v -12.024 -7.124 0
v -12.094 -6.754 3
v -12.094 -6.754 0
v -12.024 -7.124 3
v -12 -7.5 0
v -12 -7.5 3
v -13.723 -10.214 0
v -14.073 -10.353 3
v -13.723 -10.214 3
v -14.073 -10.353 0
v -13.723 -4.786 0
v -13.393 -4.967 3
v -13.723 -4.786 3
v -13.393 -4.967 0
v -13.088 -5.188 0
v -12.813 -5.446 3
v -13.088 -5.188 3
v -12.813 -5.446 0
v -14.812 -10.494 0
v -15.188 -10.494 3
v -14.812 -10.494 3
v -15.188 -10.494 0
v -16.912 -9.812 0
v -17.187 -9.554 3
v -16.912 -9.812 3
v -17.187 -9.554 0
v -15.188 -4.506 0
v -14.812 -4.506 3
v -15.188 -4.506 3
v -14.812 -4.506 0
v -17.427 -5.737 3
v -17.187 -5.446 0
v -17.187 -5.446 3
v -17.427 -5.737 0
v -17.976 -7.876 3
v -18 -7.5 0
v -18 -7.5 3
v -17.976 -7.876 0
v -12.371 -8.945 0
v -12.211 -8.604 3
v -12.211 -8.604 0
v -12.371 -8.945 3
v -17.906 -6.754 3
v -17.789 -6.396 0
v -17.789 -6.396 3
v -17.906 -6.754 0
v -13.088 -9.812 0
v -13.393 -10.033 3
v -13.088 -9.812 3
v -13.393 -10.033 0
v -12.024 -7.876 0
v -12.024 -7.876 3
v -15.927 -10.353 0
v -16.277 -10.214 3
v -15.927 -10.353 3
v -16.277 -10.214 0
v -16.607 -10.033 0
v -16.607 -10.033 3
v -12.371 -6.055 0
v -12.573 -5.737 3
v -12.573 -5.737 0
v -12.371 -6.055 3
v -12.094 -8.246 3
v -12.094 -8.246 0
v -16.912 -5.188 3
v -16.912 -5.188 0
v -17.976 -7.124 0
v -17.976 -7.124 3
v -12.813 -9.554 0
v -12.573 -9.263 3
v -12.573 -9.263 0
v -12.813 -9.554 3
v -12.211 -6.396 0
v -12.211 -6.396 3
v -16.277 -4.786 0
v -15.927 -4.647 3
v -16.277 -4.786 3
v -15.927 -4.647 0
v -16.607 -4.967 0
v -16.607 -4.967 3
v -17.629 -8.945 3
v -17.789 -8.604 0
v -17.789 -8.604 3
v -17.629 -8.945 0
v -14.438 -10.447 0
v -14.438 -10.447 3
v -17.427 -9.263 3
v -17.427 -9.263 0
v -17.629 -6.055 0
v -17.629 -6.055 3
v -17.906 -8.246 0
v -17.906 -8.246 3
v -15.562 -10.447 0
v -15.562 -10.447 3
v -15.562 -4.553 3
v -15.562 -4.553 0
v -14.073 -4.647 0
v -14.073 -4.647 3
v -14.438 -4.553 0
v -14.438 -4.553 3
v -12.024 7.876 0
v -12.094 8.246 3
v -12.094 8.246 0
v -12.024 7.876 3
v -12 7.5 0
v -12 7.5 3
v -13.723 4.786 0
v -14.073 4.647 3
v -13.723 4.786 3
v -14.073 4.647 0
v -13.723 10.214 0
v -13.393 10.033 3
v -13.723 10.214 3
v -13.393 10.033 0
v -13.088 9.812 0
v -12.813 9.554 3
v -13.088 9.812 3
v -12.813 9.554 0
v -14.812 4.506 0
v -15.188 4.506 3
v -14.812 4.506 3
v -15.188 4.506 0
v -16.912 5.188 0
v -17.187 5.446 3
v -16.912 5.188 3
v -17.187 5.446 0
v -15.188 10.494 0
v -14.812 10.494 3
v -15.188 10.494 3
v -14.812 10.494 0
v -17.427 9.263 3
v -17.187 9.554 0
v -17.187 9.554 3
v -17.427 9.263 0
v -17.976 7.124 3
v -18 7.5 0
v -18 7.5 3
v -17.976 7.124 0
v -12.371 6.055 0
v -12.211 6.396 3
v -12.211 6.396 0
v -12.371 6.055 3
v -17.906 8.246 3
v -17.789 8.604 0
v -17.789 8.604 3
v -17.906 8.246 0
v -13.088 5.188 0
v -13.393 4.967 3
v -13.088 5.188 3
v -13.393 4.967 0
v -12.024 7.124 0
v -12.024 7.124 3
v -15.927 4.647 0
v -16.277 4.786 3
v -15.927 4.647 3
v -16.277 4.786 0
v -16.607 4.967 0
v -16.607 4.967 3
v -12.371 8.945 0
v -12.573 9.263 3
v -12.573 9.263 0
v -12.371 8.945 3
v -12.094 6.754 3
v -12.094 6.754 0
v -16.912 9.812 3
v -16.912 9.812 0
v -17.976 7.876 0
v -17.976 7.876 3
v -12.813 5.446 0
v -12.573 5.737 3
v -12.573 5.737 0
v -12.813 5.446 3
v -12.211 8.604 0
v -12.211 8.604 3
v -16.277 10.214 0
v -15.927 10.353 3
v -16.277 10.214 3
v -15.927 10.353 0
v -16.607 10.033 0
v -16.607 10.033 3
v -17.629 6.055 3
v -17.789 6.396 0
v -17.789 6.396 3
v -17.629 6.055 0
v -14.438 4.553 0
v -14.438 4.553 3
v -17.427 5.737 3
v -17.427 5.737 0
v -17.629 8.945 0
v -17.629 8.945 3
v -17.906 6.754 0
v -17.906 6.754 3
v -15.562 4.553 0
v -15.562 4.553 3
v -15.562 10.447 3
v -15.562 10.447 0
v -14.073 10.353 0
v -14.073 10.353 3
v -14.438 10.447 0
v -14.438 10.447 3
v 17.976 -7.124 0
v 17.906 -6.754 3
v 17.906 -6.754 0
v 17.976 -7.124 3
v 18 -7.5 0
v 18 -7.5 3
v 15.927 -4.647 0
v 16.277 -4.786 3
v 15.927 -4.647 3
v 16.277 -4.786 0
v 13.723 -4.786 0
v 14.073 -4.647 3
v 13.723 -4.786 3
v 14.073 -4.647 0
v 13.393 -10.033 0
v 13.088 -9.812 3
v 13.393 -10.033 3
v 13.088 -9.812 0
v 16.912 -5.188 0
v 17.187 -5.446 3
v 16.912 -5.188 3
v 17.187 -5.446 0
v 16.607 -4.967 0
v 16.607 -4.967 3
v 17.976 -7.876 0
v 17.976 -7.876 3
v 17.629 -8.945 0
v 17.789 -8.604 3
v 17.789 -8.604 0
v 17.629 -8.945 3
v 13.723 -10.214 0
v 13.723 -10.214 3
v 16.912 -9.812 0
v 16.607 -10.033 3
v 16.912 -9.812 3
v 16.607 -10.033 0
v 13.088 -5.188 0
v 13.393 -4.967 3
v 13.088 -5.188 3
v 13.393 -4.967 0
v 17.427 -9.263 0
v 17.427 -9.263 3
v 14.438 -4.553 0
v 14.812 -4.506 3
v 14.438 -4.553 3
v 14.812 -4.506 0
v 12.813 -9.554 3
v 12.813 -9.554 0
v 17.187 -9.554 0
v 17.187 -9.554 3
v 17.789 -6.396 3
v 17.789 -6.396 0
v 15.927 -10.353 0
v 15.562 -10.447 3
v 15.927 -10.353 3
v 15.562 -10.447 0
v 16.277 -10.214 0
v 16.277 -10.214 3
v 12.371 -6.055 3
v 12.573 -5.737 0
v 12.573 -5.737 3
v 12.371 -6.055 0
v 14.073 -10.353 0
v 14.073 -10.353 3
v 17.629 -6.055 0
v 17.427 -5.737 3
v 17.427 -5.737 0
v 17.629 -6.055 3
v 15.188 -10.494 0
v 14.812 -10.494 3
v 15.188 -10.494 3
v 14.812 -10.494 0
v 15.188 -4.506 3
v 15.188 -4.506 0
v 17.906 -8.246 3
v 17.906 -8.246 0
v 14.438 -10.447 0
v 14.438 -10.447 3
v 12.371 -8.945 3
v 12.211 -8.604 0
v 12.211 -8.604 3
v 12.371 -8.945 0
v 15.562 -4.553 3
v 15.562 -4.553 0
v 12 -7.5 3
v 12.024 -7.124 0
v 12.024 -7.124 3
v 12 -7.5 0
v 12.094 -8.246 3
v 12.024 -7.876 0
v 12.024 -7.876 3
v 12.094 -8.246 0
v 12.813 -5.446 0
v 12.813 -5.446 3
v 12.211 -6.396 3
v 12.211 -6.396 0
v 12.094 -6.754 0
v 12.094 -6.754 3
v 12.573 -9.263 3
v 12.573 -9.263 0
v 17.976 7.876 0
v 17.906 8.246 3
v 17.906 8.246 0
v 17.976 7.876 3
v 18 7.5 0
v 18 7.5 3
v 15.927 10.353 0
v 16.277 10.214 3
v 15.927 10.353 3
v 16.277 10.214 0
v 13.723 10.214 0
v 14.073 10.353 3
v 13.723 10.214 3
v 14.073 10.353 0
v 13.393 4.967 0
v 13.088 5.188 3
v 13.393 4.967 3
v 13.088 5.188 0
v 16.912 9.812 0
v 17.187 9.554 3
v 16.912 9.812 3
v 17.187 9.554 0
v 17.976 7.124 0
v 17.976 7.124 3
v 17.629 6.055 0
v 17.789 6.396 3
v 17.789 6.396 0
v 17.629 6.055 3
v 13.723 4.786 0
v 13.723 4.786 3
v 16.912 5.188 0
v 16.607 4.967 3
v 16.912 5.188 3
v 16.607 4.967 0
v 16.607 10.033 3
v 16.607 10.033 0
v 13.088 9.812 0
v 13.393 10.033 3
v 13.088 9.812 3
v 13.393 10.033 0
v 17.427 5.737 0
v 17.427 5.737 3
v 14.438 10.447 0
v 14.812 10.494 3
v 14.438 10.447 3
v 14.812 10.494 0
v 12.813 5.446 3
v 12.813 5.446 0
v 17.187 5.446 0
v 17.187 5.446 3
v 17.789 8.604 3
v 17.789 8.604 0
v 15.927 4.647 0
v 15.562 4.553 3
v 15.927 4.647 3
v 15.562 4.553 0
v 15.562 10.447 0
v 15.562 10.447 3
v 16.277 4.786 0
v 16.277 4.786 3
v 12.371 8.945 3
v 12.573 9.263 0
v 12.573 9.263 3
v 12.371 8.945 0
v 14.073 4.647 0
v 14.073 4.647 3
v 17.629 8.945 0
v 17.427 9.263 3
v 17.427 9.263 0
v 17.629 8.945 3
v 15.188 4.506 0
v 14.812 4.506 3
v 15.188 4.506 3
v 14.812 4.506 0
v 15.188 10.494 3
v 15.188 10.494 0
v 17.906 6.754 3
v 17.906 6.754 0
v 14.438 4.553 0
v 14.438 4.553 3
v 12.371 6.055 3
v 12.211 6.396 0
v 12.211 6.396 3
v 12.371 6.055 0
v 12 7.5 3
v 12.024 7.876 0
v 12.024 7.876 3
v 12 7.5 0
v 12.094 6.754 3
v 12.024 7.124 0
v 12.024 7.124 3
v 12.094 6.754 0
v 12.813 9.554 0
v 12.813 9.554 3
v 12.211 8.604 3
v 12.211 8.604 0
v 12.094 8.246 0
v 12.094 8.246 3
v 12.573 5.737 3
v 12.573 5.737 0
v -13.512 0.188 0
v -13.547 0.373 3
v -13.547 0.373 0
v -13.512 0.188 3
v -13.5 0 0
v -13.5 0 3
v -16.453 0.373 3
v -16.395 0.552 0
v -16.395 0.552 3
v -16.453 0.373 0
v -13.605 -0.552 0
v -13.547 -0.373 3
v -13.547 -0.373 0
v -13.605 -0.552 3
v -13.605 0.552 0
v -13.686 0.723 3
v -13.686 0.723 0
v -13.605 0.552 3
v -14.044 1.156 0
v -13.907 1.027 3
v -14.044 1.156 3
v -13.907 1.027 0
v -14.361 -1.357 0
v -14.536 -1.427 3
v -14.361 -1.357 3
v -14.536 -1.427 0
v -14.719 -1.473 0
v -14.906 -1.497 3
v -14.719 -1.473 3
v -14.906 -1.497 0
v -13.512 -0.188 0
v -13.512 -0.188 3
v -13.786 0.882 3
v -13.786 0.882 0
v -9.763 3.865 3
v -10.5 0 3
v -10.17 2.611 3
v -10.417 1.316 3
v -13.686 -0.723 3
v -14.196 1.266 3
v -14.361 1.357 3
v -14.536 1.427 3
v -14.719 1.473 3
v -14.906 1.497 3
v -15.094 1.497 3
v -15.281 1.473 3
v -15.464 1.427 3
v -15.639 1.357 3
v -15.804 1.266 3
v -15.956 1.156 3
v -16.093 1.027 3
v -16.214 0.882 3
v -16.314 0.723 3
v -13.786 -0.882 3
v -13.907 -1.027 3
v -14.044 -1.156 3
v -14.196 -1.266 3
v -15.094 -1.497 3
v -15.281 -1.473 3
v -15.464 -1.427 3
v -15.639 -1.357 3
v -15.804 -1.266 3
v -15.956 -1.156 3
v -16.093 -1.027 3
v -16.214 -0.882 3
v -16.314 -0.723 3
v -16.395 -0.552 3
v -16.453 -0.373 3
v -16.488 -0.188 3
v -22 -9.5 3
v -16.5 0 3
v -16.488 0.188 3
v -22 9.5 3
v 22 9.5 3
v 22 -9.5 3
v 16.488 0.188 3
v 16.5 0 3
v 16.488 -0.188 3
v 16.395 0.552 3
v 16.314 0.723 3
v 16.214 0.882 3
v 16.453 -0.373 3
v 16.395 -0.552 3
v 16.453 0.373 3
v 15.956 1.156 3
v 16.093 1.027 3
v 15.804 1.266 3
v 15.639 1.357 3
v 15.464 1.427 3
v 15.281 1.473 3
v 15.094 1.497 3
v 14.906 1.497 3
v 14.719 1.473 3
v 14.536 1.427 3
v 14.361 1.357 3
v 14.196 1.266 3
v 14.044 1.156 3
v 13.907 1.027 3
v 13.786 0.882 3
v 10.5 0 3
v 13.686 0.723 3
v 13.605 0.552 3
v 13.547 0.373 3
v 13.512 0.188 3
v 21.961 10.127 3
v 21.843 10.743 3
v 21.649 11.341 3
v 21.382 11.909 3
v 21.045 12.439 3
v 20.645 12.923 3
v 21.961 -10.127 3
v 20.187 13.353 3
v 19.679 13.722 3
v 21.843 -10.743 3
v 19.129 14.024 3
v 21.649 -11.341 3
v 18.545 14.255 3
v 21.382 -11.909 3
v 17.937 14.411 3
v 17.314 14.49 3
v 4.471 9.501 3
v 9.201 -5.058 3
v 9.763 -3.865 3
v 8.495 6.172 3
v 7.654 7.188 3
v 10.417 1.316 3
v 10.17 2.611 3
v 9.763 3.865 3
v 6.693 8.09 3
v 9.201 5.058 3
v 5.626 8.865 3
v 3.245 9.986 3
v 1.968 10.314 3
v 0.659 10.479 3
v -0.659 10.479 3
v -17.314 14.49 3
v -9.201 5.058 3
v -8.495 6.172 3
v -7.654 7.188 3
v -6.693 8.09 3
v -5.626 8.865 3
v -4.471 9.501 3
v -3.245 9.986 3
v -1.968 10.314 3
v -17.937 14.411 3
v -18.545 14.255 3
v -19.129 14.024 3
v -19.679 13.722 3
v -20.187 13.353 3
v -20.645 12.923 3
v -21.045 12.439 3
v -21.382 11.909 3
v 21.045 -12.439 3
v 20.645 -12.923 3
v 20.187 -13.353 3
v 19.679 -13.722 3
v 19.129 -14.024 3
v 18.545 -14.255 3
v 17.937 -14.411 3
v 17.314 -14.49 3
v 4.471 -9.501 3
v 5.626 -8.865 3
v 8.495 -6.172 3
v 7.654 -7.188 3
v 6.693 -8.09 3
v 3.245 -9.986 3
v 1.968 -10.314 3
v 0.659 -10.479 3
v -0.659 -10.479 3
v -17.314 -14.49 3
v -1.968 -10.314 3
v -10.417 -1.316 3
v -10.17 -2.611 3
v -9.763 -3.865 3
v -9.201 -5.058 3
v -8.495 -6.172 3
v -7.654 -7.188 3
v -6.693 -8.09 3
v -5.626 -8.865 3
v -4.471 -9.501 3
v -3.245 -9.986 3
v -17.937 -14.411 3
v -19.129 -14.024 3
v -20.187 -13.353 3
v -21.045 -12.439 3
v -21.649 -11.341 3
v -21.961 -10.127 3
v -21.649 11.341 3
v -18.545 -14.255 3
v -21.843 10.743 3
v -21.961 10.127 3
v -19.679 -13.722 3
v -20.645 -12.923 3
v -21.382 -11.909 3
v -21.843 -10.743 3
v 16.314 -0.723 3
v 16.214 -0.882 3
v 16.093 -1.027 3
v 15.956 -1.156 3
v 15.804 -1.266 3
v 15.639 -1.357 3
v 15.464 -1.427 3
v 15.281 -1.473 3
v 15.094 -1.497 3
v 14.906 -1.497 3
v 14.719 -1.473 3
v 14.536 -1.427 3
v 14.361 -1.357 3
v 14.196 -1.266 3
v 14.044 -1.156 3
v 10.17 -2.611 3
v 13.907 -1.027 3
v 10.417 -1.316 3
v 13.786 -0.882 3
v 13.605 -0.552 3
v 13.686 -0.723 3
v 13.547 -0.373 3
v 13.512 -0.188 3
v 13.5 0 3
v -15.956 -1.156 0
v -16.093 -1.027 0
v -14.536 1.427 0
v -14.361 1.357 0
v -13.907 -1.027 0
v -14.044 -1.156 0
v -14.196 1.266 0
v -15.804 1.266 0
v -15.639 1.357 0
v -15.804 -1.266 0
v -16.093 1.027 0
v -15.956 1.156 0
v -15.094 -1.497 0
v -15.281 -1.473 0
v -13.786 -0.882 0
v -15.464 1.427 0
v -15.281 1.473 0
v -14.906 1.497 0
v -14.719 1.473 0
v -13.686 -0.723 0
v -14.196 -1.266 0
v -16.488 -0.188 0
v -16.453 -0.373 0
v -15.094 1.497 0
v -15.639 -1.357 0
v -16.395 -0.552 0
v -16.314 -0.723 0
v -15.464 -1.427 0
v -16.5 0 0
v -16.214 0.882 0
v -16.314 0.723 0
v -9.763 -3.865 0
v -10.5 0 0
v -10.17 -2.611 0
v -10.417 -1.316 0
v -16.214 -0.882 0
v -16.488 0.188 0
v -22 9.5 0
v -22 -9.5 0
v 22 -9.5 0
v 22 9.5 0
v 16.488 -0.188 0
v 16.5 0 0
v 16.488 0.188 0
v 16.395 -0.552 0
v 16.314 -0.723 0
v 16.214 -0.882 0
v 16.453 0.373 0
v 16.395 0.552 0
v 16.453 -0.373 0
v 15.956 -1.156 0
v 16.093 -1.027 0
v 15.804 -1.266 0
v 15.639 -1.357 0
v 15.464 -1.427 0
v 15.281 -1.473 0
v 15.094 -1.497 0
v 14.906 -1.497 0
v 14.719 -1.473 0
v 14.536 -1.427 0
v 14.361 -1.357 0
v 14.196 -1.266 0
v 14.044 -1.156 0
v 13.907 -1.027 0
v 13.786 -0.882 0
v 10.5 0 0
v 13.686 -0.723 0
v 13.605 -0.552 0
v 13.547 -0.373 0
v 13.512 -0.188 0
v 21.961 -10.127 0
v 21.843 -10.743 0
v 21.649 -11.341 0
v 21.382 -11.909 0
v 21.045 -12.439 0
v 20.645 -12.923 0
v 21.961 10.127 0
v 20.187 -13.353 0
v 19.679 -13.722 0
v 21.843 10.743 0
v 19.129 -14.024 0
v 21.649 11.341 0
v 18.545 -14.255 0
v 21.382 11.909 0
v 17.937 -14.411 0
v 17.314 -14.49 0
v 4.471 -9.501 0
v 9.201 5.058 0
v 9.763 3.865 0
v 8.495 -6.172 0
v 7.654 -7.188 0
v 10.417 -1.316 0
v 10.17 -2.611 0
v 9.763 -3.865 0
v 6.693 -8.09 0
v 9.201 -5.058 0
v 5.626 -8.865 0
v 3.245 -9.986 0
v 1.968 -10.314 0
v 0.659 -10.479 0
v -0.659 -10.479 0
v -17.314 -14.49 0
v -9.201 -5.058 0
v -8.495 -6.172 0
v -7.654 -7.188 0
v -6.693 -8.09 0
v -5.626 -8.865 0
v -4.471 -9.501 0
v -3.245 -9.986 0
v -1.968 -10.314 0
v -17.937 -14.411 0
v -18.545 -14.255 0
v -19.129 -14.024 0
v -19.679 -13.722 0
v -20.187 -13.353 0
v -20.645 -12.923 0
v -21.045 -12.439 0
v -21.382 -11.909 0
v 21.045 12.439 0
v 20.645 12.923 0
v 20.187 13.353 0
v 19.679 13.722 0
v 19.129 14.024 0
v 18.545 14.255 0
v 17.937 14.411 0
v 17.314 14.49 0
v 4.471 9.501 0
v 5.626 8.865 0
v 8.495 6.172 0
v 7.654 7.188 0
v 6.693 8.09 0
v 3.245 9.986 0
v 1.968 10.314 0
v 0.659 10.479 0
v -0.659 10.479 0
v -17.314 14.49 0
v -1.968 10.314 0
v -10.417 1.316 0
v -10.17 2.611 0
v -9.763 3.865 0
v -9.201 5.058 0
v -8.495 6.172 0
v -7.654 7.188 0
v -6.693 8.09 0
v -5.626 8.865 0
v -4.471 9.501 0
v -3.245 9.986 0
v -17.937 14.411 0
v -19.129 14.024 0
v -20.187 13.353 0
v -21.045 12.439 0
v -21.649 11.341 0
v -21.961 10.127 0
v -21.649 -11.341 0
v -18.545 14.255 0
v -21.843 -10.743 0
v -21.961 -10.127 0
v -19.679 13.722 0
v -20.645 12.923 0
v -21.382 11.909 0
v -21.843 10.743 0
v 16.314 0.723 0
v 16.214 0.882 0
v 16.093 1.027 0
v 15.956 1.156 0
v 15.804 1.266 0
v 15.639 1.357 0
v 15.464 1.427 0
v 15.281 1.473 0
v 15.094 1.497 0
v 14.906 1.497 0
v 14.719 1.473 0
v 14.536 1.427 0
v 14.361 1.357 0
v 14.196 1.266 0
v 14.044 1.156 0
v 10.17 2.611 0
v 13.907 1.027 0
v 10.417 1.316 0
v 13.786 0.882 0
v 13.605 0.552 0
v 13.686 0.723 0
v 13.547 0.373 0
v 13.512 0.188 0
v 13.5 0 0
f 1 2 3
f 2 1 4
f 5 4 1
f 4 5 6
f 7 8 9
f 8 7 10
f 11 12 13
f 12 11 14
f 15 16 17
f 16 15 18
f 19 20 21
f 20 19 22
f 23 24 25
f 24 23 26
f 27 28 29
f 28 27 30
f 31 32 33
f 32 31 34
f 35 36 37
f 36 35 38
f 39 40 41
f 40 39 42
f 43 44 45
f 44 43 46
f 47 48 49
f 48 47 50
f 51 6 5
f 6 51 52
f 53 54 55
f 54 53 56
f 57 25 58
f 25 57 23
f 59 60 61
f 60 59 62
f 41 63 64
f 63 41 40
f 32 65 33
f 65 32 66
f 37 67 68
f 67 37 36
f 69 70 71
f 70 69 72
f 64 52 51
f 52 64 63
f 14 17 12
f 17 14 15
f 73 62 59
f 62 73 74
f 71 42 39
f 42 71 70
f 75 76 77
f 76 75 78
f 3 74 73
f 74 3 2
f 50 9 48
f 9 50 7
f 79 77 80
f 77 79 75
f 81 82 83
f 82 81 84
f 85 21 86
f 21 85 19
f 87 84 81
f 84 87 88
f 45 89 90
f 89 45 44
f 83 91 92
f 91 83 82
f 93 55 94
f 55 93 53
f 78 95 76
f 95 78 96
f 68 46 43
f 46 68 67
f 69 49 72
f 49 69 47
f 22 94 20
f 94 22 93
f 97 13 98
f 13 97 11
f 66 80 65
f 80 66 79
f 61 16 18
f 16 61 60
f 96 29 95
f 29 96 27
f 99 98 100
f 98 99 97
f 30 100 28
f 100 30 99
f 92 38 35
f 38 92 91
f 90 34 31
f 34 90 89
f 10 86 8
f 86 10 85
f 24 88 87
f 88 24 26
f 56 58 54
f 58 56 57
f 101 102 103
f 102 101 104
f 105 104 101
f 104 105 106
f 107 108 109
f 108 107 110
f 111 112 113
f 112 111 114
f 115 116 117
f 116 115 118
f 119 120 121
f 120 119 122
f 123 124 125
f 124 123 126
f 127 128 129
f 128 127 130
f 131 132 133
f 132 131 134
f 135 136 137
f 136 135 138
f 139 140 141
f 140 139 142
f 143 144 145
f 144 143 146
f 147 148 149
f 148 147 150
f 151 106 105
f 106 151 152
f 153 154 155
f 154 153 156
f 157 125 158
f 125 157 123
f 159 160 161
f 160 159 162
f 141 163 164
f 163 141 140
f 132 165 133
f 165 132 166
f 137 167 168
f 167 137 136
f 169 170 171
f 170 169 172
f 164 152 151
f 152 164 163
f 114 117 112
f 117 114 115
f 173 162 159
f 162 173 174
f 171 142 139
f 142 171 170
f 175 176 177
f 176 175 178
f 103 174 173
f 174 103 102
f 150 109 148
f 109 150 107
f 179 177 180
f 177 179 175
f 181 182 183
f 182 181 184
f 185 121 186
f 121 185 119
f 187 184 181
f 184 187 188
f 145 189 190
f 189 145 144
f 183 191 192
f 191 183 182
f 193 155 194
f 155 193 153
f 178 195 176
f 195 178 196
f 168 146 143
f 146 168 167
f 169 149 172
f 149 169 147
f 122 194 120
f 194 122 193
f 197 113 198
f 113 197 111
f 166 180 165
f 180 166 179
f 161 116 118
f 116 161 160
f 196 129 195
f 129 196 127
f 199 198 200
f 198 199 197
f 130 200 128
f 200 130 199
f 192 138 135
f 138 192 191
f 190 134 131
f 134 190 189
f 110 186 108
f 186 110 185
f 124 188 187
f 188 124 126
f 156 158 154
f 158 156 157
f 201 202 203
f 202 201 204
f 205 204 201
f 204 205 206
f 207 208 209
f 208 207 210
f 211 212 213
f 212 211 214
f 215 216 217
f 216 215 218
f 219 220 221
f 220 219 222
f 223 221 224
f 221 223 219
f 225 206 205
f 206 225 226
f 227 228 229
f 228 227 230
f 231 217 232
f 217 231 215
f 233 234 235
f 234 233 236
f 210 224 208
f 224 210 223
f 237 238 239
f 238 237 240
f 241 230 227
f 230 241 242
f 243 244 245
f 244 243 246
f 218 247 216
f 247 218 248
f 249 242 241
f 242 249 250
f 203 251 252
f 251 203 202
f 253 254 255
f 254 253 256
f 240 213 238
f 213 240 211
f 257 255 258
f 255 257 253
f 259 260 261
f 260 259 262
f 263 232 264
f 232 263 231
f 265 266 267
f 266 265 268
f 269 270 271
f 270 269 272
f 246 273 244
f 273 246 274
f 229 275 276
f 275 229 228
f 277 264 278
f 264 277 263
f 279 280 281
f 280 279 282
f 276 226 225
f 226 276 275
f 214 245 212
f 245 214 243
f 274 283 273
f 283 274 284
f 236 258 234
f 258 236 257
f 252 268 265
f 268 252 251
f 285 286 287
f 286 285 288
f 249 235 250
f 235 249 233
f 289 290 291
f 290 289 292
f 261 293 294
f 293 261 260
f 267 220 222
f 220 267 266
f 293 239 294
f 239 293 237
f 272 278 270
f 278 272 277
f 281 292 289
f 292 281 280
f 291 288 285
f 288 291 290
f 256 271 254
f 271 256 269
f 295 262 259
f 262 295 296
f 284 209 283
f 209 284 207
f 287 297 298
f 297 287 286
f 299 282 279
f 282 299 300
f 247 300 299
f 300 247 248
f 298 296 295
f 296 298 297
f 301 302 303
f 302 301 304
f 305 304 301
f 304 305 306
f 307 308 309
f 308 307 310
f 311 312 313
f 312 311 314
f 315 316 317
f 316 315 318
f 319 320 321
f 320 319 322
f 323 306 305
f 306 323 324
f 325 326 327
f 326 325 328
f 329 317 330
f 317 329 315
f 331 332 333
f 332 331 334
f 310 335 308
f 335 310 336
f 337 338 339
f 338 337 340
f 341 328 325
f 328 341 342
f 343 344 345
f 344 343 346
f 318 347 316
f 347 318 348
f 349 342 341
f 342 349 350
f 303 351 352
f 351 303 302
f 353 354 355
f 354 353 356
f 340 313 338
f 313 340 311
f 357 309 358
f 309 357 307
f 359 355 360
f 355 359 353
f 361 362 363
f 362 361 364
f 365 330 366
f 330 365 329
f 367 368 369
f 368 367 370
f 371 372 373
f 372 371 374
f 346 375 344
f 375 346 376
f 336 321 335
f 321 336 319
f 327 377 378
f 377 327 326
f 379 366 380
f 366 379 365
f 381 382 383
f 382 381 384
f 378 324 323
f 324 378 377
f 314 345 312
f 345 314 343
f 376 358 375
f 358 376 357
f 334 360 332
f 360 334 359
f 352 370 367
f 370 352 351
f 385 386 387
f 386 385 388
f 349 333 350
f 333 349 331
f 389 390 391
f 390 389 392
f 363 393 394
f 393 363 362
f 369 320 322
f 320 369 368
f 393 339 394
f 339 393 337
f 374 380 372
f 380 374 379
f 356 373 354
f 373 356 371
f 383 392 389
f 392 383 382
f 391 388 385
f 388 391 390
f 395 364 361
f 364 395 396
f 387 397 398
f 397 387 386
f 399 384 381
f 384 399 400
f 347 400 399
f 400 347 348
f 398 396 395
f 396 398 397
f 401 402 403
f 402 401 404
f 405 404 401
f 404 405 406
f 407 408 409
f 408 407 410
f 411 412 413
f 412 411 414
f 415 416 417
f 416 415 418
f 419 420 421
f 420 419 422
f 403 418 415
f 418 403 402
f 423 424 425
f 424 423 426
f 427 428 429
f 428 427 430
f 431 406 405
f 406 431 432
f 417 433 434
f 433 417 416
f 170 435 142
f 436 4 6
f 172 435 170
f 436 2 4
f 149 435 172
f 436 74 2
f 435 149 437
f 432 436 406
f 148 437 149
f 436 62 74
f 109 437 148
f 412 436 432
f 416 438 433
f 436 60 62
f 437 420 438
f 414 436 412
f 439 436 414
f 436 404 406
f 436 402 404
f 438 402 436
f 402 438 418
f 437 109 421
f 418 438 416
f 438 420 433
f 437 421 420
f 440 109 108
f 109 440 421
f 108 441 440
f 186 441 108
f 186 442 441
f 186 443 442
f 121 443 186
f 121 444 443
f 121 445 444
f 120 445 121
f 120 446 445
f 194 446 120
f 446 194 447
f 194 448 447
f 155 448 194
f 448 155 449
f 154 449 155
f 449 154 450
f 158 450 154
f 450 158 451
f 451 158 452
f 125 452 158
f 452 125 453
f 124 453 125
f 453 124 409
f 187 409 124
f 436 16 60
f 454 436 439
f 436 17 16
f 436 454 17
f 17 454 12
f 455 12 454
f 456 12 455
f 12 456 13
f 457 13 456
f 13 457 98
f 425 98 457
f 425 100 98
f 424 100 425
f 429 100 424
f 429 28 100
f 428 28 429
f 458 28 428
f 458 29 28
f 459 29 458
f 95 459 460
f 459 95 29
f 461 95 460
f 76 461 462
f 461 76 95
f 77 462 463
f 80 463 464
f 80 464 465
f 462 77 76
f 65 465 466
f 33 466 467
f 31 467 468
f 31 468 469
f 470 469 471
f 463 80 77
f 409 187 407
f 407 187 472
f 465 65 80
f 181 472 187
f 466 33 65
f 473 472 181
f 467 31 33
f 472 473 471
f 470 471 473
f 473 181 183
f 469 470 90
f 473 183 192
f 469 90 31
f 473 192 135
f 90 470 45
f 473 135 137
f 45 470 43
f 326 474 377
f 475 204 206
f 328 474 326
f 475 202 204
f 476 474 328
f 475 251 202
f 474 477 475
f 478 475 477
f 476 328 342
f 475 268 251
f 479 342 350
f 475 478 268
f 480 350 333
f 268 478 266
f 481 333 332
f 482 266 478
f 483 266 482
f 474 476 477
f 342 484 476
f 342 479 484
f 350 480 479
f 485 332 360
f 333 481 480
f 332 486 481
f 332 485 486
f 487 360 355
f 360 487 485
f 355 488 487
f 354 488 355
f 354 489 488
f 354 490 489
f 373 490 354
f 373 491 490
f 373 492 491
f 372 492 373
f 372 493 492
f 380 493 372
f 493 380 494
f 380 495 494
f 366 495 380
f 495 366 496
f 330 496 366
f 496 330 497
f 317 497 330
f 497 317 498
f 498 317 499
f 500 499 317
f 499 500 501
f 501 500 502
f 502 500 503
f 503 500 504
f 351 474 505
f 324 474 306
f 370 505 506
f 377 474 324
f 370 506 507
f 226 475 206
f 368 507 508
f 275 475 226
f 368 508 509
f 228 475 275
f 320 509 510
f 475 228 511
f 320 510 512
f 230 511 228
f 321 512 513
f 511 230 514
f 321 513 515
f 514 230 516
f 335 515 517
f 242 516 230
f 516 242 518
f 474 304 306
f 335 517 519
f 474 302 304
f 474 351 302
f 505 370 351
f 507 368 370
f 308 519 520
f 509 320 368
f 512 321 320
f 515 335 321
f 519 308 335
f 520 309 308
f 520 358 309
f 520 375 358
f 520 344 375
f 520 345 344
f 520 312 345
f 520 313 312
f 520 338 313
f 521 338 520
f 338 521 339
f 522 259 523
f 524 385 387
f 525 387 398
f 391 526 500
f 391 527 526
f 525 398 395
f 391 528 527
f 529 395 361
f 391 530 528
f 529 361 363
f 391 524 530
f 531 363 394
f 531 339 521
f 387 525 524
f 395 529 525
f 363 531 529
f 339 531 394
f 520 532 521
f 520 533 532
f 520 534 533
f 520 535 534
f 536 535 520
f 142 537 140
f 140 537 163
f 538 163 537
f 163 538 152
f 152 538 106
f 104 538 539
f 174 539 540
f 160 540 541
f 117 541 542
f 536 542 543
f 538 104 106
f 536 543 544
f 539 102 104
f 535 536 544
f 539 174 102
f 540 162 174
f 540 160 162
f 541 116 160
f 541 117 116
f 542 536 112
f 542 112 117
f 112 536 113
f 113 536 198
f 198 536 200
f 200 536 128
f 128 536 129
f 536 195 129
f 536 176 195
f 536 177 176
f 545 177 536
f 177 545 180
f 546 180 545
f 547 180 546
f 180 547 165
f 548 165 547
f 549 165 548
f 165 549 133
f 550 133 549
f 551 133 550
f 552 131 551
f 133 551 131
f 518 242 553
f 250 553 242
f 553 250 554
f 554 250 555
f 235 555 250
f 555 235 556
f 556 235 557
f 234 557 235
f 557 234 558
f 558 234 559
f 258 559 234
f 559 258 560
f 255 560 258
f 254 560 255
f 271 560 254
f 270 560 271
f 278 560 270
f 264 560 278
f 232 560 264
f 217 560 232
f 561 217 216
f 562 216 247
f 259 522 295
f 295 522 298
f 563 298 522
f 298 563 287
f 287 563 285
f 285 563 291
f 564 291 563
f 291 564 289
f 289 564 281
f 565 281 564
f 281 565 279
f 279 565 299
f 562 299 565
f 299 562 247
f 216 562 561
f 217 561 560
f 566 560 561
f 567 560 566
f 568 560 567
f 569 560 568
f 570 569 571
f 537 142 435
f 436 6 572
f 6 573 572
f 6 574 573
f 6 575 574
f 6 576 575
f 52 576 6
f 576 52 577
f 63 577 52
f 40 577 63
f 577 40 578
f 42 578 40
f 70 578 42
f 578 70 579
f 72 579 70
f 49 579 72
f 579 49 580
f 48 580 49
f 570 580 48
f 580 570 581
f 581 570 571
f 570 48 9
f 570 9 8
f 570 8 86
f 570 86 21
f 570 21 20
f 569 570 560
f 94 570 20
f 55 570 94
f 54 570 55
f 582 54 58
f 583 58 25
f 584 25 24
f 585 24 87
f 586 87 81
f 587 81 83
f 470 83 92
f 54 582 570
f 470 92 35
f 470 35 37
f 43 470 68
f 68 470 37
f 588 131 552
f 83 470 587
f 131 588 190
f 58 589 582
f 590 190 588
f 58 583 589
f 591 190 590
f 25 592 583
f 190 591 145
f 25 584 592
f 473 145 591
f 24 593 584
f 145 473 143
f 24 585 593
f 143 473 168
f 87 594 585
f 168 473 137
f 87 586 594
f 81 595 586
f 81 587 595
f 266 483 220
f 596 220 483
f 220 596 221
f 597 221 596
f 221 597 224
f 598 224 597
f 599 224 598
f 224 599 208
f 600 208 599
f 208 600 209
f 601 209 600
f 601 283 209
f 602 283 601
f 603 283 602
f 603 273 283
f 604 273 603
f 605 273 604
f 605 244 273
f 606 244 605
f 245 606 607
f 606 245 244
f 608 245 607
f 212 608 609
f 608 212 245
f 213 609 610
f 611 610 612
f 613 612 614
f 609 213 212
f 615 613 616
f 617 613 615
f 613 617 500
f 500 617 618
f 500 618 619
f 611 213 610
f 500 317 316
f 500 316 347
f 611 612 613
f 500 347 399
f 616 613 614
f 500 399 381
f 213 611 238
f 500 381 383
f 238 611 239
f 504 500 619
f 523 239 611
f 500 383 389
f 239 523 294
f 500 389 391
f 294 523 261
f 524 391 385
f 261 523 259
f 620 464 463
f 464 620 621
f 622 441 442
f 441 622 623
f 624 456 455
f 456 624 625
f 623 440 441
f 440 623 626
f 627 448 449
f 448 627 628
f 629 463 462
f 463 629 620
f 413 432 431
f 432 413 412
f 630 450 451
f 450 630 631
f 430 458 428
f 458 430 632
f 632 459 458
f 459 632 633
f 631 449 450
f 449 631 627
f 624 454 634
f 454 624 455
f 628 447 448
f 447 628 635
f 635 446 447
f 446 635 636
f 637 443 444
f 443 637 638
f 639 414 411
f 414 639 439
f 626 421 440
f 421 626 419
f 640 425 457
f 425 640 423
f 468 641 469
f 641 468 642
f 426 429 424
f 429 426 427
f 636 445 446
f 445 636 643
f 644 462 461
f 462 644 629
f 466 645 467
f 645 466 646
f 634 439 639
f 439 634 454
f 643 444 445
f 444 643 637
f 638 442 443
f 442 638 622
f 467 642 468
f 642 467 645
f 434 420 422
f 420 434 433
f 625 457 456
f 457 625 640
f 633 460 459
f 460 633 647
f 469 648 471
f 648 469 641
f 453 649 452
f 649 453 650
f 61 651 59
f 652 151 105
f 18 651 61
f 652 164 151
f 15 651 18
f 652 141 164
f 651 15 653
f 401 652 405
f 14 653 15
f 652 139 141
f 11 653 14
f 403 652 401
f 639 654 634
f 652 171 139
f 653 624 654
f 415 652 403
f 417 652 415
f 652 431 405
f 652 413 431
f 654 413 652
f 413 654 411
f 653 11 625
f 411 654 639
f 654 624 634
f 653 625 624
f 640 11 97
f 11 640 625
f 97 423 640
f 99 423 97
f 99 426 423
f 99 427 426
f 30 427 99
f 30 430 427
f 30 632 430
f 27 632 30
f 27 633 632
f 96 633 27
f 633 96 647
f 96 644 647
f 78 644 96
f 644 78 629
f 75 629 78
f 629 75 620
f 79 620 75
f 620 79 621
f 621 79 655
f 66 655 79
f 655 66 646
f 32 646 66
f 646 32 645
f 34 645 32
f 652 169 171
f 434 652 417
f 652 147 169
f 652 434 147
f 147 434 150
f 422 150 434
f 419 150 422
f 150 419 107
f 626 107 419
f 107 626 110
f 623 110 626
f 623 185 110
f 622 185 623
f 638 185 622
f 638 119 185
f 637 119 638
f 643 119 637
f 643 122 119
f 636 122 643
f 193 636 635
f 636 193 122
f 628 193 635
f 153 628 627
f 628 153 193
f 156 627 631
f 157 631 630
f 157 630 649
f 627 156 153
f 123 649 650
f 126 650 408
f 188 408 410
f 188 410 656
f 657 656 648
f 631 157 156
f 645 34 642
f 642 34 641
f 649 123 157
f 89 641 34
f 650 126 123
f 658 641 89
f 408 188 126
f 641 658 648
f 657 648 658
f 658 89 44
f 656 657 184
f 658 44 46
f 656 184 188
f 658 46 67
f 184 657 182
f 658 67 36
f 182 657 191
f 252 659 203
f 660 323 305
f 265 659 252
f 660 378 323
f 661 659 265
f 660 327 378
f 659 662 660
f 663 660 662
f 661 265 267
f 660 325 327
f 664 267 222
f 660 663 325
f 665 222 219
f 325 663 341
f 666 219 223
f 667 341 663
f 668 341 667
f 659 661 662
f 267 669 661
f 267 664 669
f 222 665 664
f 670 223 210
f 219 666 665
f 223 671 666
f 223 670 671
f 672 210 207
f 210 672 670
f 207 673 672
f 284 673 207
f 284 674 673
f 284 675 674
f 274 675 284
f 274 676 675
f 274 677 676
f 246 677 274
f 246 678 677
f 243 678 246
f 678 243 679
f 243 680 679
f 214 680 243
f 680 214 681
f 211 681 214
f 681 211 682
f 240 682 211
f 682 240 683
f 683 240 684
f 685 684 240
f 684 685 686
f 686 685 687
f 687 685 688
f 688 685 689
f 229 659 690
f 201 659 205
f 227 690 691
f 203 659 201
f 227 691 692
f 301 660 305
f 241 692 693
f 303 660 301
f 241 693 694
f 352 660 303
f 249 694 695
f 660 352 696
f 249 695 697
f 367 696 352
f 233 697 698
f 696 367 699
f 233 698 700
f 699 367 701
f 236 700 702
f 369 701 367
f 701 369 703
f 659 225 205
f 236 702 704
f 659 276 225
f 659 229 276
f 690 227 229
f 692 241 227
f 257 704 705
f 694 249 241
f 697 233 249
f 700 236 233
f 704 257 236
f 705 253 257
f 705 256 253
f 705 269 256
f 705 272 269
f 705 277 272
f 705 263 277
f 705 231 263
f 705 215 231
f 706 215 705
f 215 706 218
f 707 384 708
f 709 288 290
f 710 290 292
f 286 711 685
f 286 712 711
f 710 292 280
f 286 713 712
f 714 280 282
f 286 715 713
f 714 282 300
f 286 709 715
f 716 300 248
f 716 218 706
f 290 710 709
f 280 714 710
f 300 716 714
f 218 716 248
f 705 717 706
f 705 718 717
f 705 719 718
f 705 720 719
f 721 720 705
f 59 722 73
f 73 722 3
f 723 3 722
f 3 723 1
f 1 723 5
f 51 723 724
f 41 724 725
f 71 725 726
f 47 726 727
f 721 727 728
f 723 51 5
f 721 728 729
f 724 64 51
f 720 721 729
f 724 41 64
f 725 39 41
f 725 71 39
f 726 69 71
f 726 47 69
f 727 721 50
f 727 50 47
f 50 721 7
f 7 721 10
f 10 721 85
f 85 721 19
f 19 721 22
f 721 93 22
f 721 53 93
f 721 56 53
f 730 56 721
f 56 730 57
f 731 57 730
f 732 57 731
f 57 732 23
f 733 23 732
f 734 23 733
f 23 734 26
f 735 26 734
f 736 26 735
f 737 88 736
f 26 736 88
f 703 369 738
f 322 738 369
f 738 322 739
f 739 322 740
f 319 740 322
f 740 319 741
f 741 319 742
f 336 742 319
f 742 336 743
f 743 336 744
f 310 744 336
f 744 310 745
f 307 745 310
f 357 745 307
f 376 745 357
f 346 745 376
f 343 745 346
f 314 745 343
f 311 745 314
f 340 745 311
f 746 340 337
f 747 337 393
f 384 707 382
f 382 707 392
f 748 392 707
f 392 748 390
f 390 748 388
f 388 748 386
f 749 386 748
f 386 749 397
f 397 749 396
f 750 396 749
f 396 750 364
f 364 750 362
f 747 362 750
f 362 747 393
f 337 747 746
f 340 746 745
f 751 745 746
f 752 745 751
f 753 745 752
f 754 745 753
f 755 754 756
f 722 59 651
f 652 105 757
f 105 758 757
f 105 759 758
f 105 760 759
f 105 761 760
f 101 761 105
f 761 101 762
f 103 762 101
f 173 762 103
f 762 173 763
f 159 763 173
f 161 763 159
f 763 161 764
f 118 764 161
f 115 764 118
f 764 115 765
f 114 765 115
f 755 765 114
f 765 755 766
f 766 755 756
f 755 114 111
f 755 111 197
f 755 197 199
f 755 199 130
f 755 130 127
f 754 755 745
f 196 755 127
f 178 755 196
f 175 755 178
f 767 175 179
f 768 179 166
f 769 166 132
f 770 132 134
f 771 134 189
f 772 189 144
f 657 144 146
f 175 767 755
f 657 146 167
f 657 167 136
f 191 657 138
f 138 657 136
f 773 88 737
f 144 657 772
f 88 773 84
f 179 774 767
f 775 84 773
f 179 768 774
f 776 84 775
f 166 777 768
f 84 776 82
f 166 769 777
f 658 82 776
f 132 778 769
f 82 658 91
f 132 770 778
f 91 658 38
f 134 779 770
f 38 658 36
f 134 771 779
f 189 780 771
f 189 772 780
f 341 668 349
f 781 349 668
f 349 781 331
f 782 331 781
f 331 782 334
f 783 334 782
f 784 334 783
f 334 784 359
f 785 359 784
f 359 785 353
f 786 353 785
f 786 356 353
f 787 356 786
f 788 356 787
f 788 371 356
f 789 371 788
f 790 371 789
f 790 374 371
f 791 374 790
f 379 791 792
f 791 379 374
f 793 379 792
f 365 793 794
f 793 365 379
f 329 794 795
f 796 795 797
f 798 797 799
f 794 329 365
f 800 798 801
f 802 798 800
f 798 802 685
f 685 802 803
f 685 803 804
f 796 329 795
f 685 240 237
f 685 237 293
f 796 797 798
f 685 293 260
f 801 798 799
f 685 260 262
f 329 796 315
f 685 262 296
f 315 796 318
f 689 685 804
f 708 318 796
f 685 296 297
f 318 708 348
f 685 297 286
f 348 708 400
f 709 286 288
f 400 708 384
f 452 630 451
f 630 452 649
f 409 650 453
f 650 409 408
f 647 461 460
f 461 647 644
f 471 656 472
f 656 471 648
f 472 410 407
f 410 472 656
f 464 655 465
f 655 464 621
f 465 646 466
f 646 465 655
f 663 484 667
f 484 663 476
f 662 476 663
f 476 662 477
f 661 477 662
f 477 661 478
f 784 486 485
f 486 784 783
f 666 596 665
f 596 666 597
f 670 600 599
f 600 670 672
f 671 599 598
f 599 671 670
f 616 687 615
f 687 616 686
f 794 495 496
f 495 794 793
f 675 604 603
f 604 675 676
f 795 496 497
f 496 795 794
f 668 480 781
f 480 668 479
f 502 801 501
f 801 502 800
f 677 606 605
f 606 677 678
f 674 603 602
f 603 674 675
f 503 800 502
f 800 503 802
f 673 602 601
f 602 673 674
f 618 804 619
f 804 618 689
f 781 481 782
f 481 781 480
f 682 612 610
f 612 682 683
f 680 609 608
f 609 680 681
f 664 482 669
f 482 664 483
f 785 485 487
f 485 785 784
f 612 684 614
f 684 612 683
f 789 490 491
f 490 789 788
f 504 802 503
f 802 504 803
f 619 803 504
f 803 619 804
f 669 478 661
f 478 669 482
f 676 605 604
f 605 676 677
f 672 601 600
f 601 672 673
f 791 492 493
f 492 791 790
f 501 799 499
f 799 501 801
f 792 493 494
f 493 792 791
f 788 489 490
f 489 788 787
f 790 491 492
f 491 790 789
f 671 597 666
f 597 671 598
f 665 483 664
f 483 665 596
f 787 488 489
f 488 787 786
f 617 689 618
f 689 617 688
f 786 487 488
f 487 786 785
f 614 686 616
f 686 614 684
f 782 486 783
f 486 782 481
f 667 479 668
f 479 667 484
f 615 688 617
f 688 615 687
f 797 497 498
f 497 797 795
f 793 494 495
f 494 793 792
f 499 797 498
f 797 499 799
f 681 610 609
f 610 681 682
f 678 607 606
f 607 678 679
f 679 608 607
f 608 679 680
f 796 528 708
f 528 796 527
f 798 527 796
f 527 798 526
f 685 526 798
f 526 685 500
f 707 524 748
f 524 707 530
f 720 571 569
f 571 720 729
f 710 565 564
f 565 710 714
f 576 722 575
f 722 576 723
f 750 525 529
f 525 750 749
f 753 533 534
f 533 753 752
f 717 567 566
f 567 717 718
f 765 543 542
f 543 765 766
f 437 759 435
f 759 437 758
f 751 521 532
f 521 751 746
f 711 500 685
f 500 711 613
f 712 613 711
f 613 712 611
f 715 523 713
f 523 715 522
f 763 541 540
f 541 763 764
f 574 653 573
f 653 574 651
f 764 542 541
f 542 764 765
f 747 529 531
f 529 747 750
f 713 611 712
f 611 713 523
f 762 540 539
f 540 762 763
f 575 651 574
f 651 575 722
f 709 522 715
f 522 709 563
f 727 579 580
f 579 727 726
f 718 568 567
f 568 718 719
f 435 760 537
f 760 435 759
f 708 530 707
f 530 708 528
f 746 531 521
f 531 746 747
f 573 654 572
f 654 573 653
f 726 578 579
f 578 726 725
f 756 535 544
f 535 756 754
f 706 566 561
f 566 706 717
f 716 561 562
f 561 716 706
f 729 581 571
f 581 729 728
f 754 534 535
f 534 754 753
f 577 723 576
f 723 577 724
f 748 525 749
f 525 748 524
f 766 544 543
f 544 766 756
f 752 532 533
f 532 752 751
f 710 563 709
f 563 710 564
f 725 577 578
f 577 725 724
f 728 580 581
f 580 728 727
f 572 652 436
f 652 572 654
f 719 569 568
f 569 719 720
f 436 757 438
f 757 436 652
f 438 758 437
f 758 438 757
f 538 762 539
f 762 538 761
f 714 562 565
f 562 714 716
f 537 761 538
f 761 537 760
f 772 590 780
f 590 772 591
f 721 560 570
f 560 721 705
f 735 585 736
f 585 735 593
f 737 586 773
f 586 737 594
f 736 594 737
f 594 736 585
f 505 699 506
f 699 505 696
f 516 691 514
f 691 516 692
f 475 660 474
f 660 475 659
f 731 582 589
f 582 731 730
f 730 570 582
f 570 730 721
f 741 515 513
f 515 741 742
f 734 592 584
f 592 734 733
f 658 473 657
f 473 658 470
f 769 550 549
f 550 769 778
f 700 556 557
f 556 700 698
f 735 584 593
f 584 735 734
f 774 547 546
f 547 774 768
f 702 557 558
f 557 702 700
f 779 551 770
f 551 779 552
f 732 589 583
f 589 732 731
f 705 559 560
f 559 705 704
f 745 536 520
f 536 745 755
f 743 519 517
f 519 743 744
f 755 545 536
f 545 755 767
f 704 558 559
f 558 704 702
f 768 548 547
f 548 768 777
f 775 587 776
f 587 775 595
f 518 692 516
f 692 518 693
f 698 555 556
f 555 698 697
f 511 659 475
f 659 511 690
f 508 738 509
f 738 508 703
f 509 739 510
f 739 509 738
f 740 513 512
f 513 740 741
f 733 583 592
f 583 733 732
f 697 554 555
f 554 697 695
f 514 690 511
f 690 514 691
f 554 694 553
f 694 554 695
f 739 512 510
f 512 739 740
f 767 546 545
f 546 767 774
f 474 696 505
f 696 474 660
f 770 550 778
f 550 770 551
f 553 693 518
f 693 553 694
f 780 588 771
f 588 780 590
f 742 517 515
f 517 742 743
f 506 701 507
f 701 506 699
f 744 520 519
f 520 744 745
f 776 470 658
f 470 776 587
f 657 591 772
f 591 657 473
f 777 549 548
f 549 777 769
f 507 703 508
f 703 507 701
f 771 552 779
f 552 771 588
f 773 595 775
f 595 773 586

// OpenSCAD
$fn = 50;


difference() {
	union() {
		hull() {
			translate(v = [-17.0000000000, 9.5000000000, 0]) {
				cylinder(h = 3, r = 5);
			}
			translate(v = [17.0000000000, 9.5000000000, 0]) {
				cylinder(h = 3, r = 5);
			}
			translate(v = [-17.0000000000, -9.5000000000, 0]) {
				cylinder(h = 3, r = 5);
			}
			translate(v = [17.0000000000, -9.5000000000, 0]) {
				cylinder(h = 3, r = 5);
			}
		}
	}
	union() {
		#translate(v = [-15.0000000000, -7.5000000000, 0]) {
			cylinder(h = 3, r = 3.0000000000);
		}
		#translate(v = [-15.0000000000, 7.5000000000, 0]) {
			cylinder(h = 3, r = 3.0000000000);
		}
		#translate(v = [15.0000000000, -7.5000000000, 0]) {
			cylinder(h = 3, r = 3.0000000000);
		}
		#translate(v = [15.0000000000, 7.5000000000, 0]) {
			cylinder(h = 3, r = 3.0000000000);
		}
		#translate(v = [-15.0000000000, -7.5000000000, -100.0000000000]) {
			cylinder(h = 200, r = 3.0000000000);
		}
		#translate(v = [-15.0000000000, 7.5000000000, -100.0000000000]) {
			cylinder(h = 200, r = 3.0000000000);
		}
		#translate(v = [15.0000000000, -7.5000000000, -100.0000000000]) {
			cylinder(h = 200, r = 3.0000000000);
		}
		#translate(v = [15.0000000000, 7.5000000000, -100.0000000000]) {
			cylinder(h = 200, r = 3.0000000000);
		}
		#translate(v = [-15.0000000000, -7.5000000000, 0]) {
			cylinder(h = 3, r = 1.5000000000);
		}
		#translate(v = [-15.0000000000, 0.0000000000, 0]) {
			cylinder(h = 3, r = 1.5000000000);
		}
		#translate(v = [-15.0000000000, 7.5000000000, 0]) {
			cylinder(h = 3, r = 1.5000000000);
		}
		#translate(v = [15.0000000000, -7.5000000000, 0]) {
			cylinder(h = 3, r = 1.5000000000);
		}
		#translate(v = [15.0000000000, 0.0000000000, 0]) {
			cylinder(h = 3, r = 1.5000000000);
		}
		#translate(v = [15.0000000000, 7.5000000000, 0]) {
			cylinder(h = 3, r = 1.5000000000);
		}
		#translate(v = [-15.0000000000, -7.5000000000, 0]) {
			cylinder(h = 3, r = 1.5000000000);
		}
		#translate(v = [-15.0000000000, 0.0000000000, 0]) {
			cylinder(h = 3, r = 1.5000000000);
		}
		#translate(v = [-15.0000000000, 7.5000000000, 0]) {
			cylinder(h = 3, r = 1.5000000000);
		}
		#translate(v = [15.0000000000, -7.5000000000, 0]) {
			cylinder(h = 3, r = 1.5000000000);
		}
		#translate(v = [15.0000000000, 0.0000000000, 0]) {
			cylinder(h = 3, r = 1.5000000000);
		}
		#translate(v = [15.0000000000, 7.5000000000, 0]) {
			cylinder(h = 3, r = 1.5000000000);
		}
		#translate(v = [-15.0000000000, -7.5000000000, 0]) {
			cylinder(h = 3, r = 1.5000000000);
		}
		#translate(v = [-15.0000000000, 0.0000000000, 0]) {
			cylinder(h = 3, r = 1.5000000000);
		}
		#translate(v = [-15.0000000000, 7.5000000000, 0]) {
			cylinder(h = 3, r = 1.5000000000);
		}
		#translate(v = [15.0000000000, -7.5000000000, 0]) {
			cylinder(h = 3, r = 1.5000000000);
		}
		#translate(v = [15.0000000000, 0.0000000000, 0]) {
			cylinder(h = 3, r = 1.5000000000);
		}
		#translate(v = [15.0000000000, 7.5000000000, 0]) {
			cylinder(h = 3, r = 1.5000000000);
		}
		#cylinder(h = 3, r = 10.5000000000);
	}
}
